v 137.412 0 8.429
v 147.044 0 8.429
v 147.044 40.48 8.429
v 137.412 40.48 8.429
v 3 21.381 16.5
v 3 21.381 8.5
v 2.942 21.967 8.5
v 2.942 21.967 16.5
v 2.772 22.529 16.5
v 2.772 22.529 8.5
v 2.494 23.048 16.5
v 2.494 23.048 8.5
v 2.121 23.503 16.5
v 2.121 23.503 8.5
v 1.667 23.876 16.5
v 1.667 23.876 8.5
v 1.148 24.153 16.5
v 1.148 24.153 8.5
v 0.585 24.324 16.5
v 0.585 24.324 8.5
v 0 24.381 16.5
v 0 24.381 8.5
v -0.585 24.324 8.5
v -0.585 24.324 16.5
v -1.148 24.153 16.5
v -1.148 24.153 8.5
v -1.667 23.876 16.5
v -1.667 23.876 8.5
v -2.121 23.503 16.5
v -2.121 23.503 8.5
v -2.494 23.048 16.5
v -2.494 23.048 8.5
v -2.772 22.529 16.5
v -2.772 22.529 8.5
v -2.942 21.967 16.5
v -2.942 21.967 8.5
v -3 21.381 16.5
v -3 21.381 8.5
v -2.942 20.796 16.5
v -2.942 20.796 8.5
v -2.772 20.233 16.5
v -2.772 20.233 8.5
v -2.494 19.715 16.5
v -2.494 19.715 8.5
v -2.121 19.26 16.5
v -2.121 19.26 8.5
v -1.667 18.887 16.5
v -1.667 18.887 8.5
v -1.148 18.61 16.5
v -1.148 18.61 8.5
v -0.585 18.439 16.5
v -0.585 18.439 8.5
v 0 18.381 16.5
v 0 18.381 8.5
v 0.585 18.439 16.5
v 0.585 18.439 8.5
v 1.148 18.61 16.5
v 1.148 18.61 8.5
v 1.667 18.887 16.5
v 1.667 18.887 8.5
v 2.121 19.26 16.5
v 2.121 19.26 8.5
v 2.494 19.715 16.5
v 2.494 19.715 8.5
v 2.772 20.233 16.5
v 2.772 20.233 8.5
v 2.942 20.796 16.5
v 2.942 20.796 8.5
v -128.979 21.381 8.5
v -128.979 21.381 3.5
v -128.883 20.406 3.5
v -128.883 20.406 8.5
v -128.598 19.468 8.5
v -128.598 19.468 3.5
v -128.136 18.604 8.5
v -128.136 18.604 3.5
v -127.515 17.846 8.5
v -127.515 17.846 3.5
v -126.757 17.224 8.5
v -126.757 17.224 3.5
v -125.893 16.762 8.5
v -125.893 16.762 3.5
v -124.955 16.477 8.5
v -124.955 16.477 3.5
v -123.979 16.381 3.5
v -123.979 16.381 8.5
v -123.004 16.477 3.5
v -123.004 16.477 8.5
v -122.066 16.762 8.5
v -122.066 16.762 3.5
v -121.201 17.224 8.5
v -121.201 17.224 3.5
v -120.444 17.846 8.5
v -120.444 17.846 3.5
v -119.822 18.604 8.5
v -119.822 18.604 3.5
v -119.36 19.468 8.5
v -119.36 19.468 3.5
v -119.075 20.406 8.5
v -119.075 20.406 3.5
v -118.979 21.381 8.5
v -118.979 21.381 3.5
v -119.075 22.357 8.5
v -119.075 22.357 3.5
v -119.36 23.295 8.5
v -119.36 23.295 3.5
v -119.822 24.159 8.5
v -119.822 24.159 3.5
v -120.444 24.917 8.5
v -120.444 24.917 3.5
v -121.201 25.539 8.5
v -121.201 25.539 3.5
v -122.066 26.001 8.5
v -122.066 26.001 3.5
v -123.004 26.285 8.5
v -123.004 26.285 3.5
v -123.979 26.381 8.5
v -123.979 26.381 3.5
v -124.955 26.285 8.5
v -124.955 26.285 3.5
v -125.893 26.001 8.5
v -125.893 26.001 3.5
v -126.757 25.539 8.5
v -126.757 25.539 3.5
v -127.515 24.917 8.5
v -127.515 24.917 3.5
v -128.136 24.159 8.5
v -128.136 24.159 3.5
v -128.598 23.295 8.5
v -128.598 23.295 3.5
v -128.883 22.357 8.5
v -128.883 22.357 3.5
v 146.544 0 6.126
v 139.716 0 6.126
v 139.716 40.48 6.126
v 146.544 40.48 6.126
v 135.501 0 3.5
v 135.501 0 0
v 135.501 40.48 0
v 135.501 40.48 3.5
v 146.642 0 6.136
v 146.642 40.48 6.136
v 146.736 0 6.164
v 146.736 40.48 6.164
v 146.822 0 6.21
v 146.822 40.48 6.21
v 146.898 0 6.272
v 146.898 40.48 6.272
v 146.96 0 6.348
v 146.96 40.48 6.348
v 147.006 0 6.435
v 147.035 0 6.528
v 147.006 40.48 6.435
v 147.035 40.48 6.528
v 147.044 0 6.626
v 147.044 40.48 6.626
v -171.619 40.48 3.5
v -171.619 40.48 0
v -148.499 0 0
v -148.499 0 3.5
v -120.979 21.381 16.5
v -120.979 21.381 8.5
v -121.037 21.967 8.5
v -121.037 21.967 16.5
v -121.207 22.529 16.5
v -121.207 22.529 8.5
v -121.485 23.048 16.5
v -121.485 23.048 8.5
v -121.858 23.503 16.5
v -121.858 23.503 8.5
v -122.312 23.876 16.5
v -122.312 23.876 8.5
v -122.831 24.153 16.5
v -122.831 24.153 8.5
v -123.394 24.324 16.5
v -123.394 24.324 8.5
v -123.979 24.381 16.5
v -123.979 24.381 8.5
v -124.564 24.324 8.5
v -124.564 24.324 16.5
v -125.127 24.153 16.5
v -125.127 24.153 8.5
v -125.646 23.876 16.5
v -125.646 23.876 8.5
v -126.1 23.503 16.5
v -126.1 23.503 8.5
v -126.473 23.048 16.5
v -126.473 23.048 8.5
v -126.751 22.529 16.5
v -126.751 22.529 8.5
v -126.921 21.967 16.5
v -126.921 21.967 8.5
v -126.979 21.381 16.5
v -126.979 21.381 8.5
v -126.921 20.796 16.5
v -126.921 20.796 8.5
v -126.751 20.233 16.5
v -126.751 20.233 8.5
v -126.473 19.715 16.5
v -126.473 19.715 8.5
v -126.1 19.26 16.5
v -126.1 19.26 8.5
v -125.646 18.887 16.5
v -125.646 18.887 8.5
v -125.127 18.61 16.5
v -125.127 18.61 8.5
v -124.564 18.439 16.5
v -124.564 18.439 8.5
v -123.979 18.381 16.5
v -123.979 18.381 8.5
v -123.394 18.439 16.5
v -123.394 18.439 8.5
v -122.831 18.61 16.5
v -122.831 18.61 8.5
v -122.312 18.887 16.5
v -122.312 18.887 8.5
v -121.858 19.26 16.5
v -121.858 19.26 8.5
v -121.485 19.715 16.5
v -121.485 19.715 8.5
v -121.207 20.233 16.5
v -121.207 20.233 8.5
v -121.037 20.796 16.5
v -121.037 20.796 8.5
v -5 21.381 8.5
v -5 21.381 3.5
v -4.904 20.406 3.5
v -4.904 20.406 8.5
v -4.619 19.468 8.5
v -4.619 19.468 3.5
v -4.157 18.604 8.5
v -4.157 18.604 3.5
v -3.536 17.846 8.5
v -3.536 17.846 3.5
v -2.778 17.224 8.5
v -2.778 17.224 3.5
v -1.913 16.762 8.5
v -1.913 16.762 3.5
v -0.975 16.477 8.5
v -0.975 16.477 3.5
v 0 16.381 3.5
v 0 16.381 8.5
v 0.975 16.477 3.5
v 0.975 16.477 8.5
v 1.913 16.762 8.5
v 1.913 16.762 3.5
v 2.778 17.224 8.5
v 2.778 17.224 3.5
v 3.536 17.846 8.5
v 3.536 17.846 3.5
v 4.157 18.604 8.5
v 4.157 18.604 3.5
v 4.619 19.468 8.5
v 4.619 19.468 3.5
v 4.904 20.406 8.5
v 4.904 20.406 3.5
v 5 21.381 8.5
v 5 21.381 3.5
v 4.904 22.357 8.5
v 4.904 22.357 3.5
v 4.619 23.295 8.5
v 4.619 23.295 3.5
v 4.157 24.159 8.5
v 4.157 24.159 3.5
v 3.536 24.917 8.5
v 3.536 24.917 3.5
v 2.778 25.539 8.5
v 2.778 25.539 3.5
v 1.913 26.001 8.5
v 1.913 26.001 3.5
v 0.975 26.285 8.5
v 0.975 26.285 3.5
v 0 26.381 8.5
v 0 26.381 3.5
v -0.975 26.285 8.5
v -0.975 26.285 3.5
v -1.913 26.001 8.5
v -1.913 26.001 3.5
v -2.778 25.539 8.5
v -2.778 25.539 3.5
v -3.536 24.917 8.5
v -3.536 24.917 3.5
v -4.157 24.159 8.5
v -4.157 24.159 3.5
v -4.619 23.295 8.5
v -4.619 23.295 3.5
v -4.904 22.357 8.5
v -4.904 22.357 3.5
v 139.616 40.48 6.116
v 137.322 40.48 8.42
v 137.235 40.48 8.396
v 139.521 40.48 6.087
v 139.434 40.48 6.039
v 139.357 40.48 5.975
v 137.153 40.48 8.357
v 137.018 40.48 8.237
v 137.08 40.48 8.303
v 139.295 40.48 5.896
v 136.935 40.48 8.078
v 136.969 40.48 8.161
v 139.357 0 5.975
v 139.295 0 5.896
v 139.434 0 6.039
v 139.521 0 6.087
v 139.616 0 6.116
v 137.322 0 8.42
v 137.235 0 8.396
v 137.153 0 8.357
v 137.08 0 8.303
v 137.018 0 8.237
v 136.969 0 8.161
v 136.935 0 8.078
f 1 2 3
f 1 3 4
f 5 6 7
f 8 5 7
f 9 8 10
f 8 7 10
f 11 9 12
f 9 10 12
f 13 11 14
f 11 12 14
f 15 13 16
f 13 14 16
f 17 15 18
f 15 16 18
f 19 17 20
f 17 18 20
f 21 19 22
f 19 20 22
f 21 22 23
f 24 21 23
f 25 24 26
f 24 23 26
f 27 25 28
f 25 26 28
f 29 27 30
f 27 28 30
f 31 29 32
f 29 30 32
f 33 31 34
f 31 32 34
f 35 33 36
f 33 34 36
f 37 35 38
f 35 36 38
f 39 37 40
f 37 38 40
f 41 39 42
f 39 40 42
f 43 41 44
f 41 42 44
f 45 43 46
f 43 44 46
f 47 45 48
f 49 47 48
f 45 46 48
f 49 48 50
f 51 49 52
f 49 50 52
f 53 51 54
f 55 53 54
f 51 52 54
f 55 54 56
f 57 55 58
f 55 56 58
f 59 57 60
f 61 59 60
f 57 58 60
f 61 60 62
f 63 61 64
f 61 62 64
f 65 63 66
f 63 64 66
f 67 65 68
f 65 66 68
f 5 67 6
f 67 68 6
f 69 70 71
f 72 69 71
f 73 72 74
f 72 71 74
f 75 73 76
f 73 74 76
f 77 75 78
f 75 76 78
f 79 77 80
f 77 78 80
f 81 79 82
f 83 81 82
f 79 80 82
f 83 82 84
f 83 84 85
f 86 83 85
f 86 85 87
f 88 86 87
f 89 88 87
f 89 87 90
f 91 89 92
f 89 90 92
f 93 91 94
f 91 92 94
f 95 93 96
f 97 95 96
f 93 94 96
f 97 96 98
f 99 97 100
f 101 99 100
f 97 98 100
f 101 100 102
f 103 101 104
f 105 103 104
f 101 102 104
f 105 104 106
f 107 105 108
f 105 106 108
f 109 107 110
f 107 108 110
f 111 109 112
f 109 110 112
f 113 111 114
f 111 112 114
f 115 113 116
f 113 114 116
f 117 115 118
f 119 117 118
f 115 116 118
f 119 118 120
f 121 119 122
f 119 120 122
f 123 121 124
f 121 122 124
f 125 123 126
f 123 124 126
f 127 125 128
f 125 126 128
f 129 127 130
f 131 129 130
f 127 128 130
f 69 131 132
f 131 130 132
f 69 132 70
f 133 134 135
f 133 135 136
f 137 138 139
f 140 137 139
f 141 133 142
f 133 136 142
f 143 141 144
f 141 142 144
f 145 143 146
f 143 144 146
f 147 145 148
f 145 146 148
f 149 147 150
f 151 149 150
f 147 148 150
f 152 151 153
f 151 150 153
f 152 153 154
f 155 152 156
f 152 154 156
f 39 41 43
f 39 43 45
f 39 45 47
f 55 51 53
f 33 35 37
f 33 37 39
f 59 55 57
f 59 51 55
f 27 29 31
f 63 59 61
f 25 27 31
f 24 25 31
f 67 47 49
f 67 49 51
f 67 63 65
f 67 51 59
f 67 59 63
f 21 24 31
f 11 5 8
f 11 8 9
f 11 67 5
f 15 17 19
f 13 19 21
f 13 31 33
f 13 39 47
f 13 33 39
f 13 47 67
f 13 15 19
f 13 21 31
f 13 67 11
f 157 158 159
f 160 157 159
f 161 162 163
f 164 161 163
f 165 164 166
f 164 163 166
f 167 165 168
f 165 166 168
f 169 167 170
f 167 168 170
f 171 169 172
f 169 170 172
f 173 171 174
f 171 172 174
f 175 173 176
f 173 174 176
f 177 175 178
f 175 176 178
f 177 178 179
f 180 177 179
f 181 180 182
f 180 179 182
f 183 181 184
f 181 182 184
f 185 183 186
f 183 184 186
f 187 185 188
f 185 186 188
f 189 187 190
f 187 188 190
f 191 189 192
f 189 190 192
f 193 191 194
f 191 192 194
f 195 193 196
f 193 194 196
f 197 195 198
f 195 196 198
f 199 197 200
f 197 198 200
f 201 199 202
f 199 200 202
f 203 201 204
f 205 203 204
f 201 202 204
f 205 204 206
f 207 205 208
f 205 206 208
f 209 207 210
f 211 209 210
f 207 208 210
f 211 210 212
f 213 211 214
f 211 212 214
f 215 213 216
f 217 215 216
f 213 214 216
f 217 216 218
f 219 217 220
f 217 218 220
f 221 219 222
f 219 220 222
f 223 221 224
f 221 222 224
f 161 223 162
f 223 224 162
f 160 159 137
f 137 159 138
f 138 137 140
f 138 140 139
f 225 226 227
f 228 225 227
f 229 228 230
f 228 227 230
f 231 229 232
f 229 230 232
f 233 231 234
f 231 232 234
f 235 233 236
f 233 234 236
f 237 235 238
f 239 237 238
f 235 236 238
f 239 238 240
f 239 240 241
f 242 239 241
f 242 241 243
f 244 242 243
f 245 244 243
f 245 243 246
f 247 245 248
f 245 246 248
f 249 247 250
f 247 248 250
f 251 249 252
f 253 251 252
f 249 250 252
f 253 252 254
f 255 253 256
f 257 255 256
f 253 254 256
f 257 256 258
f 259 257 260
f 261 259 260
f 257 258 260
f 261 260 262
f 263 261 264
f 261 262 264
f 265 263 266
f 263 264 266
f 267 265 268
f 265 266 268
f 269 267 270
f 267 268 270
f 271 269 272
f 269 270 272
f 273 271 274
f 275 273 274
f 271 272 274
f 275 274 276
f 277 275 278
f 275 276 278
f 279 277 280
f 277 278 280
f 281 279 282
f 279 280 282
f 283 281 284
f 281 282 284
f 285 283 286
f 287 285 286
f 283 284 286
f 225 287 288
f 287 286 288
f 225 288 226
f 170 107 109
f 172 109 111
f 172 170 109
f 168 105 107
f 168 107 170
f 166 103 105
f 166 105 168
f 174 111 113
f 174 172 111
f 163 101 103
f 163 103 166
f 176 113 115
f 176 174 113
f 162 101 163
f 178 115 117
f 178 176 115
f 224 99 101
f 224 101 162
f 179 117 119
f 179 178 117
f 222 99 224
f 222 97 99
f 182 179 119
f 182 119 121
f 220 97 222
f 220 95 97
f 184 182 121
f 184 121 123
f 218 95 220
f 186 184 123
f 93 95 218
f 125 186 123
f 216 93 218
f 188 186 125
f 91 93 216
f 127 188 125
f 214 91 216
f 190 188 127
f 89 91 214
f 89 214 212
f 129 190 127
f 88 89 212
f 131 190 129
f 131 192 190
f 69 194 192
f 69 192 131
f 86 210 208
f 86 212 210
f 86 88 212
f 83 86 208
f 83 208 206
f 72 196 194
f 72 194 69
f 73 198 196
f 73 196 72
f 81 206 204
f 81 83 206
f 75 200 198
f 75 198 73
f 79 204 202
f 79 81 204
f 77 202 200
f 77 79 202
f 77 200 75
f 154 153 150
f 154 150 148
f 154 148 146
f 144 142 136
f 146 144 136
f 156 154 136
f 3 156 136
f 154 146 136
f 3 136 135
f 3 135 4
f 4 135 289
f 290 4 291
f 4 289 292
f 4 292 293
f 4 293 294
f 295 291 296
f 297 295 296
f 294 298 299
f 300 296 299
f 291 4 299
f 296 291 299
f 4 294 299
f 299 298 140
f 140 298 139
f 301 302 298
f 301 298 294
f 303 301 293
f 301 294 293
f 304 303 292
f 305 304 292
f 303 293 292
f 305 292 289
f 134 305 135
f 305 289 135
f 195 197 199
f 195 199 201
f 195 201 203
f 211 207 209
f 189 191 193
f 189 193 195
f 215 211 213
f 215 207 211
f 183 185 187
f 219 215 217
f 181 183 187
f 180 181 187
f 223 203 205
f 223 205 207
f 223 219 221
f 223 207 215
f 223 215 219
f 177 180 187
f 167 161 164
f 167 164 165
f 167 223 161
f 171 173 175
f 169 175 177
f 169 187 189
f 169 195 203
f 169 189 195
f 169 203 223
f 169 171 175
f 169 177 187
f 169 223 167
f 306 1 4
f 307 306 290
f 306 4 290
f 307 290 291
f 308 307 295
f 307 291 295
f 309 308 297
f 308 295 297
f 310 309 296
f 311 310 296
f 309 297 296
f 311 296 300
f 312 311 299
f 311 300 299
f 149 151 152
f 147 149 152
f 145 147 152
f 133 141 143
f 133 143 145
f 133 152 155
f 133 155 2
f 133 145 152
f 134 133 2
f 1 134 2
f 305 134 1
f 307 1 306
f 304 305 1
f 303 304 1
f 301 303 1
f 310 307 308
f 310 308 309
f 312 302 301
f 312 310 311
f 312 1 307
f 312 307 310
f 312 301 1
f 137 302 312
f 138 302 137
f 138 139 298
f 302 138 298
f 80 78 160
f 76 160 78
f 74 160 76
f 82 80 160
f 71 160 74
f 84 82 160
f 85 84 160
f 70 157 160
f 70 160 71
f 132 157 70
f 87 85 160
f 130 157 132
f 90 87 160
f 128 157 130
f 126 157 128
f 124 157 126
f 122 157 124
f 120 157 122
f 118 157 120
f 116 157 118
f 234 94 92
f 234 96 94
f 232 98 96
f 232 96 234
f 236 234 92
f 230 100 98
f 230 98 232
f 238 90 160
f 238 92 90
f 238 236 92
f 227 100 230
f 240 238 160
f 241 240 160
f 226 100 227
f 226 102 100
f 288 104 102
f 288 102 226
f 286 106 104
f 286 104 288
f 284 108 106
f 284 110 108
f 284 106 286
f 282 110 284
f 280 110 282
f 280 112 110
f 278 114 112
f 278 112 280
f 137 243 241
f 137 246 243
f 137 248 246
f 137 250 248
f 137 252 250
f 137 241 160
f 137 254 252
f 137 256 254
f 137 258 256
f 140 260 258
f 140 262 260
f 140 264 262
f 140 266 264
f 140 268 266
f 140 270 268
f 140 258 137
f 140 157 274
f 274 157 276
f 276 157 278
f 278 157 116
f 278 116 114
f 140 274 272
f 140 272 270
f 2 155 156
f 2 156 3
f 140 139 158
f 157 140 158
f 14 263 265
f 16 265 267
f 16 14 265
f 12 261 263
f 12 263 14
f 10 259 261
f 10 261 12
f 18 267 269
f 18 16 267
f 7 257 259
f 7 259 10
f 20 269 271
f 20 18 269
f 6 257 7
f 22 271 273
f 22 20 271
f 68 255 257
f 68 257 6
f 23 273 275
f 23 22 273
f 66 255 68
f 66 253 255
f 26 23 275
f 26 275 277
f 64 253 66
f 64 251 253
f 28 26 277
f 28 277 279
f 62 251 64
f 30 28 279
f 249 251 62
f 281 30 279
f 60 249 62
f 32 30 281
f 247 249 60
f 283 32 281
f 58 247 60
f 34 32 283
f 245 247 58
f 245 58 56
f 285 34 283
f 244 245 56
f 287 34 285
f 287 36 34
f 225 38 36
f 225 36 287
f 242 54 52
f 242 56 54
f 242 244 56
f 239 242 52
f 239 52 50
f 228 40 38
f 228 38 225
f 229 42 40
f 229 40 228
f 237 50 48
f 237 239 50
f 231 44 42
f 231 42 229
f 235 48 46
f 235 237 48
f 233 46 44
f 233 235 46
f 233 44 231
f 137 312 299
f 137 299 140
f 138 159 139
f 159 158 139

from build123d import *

# Parameters (mm, degrees)
EXTRUDE_1_DEPTH = 3.5
EXTRUDE_2_DEPTH = 40.479556073
FILLET_4_R      = 0.5
SKETCH_4_R      = 5
EXTRUDE_3_DEPTH = 5
SKETCH_5_R      = 3
EXTRUDE_4_DEPTH = 8


with BuildPart() as part:
    # 草图1 → 凸台-拉伸1 (new body)
    with BuildSketch(Plane.XY):
        Polygon((-148.498660968, 0), (135.501339032, 0), (135.501339032, 40.479556073), (-171.618506635, 40.479556073), align=None)
    extrude(amount=EXTRUDE_1_DEPTH)

    # 草图4 → 凸台-拉伸3 (add)
    with BuildSketch(Plane.XY.offset(3.5)):
        with Locations(Location((-123.979089883, 21.38139451, 0), (0, 0, 180))):
            Circle(SKETCH_4_R)
        with Locations(Location((0, 21.38139451, 0), (0, 0, 180))):
            Circle(SKETCH_4_R)
    extrude(amount=EXTRUDE_3_DEPTH)

    # 草图5 → 凸台-拉伸4 (add)
    with BuildSketch(Plane.XY.offset(8.5)):
        with Locations((-123.979089883, 21.38139451)):
            Circle(SKETCH_5_R)
        with Locations((0, 21.38139451)):
            Circle(SKETCH_5_R)
    extrude(amount=EXTRUDE_4_DEPTH)


with BuildPart() as body_2:
    # 草图3 → 凸台-拉伸2 (new body)
    with BuildSketch(Plane(origin=(0, 0, 0), x_dir=(1, 0, 0), z_dir=(0, 1, 0))):
        Polygon((135.501339032, 0), (139.442840957, -6.125927086), (147.04430839, -6.125927086), (147.04430839, -8.428518352), (137.04430839, -8.428518352), (135.501339032, -3.5), align=None)
    extrude(amount=EXTRUDE_2_DEPTH)

    # 圆角4
    fillet_4_edges = [body_2.edges().sort_by_distance(p)[0] for p in [
        (139.442840957, 20.239778036, 6.125927086),
        (147.04430839, 20.239778036, 6.125927086),
        (137.04430839, 20.239778036, 8.428518352),
    ]]
    fillet(fillet_4_edges, radius=FILLET_4_R)


solid = Compound([part.part, body_2.part])
